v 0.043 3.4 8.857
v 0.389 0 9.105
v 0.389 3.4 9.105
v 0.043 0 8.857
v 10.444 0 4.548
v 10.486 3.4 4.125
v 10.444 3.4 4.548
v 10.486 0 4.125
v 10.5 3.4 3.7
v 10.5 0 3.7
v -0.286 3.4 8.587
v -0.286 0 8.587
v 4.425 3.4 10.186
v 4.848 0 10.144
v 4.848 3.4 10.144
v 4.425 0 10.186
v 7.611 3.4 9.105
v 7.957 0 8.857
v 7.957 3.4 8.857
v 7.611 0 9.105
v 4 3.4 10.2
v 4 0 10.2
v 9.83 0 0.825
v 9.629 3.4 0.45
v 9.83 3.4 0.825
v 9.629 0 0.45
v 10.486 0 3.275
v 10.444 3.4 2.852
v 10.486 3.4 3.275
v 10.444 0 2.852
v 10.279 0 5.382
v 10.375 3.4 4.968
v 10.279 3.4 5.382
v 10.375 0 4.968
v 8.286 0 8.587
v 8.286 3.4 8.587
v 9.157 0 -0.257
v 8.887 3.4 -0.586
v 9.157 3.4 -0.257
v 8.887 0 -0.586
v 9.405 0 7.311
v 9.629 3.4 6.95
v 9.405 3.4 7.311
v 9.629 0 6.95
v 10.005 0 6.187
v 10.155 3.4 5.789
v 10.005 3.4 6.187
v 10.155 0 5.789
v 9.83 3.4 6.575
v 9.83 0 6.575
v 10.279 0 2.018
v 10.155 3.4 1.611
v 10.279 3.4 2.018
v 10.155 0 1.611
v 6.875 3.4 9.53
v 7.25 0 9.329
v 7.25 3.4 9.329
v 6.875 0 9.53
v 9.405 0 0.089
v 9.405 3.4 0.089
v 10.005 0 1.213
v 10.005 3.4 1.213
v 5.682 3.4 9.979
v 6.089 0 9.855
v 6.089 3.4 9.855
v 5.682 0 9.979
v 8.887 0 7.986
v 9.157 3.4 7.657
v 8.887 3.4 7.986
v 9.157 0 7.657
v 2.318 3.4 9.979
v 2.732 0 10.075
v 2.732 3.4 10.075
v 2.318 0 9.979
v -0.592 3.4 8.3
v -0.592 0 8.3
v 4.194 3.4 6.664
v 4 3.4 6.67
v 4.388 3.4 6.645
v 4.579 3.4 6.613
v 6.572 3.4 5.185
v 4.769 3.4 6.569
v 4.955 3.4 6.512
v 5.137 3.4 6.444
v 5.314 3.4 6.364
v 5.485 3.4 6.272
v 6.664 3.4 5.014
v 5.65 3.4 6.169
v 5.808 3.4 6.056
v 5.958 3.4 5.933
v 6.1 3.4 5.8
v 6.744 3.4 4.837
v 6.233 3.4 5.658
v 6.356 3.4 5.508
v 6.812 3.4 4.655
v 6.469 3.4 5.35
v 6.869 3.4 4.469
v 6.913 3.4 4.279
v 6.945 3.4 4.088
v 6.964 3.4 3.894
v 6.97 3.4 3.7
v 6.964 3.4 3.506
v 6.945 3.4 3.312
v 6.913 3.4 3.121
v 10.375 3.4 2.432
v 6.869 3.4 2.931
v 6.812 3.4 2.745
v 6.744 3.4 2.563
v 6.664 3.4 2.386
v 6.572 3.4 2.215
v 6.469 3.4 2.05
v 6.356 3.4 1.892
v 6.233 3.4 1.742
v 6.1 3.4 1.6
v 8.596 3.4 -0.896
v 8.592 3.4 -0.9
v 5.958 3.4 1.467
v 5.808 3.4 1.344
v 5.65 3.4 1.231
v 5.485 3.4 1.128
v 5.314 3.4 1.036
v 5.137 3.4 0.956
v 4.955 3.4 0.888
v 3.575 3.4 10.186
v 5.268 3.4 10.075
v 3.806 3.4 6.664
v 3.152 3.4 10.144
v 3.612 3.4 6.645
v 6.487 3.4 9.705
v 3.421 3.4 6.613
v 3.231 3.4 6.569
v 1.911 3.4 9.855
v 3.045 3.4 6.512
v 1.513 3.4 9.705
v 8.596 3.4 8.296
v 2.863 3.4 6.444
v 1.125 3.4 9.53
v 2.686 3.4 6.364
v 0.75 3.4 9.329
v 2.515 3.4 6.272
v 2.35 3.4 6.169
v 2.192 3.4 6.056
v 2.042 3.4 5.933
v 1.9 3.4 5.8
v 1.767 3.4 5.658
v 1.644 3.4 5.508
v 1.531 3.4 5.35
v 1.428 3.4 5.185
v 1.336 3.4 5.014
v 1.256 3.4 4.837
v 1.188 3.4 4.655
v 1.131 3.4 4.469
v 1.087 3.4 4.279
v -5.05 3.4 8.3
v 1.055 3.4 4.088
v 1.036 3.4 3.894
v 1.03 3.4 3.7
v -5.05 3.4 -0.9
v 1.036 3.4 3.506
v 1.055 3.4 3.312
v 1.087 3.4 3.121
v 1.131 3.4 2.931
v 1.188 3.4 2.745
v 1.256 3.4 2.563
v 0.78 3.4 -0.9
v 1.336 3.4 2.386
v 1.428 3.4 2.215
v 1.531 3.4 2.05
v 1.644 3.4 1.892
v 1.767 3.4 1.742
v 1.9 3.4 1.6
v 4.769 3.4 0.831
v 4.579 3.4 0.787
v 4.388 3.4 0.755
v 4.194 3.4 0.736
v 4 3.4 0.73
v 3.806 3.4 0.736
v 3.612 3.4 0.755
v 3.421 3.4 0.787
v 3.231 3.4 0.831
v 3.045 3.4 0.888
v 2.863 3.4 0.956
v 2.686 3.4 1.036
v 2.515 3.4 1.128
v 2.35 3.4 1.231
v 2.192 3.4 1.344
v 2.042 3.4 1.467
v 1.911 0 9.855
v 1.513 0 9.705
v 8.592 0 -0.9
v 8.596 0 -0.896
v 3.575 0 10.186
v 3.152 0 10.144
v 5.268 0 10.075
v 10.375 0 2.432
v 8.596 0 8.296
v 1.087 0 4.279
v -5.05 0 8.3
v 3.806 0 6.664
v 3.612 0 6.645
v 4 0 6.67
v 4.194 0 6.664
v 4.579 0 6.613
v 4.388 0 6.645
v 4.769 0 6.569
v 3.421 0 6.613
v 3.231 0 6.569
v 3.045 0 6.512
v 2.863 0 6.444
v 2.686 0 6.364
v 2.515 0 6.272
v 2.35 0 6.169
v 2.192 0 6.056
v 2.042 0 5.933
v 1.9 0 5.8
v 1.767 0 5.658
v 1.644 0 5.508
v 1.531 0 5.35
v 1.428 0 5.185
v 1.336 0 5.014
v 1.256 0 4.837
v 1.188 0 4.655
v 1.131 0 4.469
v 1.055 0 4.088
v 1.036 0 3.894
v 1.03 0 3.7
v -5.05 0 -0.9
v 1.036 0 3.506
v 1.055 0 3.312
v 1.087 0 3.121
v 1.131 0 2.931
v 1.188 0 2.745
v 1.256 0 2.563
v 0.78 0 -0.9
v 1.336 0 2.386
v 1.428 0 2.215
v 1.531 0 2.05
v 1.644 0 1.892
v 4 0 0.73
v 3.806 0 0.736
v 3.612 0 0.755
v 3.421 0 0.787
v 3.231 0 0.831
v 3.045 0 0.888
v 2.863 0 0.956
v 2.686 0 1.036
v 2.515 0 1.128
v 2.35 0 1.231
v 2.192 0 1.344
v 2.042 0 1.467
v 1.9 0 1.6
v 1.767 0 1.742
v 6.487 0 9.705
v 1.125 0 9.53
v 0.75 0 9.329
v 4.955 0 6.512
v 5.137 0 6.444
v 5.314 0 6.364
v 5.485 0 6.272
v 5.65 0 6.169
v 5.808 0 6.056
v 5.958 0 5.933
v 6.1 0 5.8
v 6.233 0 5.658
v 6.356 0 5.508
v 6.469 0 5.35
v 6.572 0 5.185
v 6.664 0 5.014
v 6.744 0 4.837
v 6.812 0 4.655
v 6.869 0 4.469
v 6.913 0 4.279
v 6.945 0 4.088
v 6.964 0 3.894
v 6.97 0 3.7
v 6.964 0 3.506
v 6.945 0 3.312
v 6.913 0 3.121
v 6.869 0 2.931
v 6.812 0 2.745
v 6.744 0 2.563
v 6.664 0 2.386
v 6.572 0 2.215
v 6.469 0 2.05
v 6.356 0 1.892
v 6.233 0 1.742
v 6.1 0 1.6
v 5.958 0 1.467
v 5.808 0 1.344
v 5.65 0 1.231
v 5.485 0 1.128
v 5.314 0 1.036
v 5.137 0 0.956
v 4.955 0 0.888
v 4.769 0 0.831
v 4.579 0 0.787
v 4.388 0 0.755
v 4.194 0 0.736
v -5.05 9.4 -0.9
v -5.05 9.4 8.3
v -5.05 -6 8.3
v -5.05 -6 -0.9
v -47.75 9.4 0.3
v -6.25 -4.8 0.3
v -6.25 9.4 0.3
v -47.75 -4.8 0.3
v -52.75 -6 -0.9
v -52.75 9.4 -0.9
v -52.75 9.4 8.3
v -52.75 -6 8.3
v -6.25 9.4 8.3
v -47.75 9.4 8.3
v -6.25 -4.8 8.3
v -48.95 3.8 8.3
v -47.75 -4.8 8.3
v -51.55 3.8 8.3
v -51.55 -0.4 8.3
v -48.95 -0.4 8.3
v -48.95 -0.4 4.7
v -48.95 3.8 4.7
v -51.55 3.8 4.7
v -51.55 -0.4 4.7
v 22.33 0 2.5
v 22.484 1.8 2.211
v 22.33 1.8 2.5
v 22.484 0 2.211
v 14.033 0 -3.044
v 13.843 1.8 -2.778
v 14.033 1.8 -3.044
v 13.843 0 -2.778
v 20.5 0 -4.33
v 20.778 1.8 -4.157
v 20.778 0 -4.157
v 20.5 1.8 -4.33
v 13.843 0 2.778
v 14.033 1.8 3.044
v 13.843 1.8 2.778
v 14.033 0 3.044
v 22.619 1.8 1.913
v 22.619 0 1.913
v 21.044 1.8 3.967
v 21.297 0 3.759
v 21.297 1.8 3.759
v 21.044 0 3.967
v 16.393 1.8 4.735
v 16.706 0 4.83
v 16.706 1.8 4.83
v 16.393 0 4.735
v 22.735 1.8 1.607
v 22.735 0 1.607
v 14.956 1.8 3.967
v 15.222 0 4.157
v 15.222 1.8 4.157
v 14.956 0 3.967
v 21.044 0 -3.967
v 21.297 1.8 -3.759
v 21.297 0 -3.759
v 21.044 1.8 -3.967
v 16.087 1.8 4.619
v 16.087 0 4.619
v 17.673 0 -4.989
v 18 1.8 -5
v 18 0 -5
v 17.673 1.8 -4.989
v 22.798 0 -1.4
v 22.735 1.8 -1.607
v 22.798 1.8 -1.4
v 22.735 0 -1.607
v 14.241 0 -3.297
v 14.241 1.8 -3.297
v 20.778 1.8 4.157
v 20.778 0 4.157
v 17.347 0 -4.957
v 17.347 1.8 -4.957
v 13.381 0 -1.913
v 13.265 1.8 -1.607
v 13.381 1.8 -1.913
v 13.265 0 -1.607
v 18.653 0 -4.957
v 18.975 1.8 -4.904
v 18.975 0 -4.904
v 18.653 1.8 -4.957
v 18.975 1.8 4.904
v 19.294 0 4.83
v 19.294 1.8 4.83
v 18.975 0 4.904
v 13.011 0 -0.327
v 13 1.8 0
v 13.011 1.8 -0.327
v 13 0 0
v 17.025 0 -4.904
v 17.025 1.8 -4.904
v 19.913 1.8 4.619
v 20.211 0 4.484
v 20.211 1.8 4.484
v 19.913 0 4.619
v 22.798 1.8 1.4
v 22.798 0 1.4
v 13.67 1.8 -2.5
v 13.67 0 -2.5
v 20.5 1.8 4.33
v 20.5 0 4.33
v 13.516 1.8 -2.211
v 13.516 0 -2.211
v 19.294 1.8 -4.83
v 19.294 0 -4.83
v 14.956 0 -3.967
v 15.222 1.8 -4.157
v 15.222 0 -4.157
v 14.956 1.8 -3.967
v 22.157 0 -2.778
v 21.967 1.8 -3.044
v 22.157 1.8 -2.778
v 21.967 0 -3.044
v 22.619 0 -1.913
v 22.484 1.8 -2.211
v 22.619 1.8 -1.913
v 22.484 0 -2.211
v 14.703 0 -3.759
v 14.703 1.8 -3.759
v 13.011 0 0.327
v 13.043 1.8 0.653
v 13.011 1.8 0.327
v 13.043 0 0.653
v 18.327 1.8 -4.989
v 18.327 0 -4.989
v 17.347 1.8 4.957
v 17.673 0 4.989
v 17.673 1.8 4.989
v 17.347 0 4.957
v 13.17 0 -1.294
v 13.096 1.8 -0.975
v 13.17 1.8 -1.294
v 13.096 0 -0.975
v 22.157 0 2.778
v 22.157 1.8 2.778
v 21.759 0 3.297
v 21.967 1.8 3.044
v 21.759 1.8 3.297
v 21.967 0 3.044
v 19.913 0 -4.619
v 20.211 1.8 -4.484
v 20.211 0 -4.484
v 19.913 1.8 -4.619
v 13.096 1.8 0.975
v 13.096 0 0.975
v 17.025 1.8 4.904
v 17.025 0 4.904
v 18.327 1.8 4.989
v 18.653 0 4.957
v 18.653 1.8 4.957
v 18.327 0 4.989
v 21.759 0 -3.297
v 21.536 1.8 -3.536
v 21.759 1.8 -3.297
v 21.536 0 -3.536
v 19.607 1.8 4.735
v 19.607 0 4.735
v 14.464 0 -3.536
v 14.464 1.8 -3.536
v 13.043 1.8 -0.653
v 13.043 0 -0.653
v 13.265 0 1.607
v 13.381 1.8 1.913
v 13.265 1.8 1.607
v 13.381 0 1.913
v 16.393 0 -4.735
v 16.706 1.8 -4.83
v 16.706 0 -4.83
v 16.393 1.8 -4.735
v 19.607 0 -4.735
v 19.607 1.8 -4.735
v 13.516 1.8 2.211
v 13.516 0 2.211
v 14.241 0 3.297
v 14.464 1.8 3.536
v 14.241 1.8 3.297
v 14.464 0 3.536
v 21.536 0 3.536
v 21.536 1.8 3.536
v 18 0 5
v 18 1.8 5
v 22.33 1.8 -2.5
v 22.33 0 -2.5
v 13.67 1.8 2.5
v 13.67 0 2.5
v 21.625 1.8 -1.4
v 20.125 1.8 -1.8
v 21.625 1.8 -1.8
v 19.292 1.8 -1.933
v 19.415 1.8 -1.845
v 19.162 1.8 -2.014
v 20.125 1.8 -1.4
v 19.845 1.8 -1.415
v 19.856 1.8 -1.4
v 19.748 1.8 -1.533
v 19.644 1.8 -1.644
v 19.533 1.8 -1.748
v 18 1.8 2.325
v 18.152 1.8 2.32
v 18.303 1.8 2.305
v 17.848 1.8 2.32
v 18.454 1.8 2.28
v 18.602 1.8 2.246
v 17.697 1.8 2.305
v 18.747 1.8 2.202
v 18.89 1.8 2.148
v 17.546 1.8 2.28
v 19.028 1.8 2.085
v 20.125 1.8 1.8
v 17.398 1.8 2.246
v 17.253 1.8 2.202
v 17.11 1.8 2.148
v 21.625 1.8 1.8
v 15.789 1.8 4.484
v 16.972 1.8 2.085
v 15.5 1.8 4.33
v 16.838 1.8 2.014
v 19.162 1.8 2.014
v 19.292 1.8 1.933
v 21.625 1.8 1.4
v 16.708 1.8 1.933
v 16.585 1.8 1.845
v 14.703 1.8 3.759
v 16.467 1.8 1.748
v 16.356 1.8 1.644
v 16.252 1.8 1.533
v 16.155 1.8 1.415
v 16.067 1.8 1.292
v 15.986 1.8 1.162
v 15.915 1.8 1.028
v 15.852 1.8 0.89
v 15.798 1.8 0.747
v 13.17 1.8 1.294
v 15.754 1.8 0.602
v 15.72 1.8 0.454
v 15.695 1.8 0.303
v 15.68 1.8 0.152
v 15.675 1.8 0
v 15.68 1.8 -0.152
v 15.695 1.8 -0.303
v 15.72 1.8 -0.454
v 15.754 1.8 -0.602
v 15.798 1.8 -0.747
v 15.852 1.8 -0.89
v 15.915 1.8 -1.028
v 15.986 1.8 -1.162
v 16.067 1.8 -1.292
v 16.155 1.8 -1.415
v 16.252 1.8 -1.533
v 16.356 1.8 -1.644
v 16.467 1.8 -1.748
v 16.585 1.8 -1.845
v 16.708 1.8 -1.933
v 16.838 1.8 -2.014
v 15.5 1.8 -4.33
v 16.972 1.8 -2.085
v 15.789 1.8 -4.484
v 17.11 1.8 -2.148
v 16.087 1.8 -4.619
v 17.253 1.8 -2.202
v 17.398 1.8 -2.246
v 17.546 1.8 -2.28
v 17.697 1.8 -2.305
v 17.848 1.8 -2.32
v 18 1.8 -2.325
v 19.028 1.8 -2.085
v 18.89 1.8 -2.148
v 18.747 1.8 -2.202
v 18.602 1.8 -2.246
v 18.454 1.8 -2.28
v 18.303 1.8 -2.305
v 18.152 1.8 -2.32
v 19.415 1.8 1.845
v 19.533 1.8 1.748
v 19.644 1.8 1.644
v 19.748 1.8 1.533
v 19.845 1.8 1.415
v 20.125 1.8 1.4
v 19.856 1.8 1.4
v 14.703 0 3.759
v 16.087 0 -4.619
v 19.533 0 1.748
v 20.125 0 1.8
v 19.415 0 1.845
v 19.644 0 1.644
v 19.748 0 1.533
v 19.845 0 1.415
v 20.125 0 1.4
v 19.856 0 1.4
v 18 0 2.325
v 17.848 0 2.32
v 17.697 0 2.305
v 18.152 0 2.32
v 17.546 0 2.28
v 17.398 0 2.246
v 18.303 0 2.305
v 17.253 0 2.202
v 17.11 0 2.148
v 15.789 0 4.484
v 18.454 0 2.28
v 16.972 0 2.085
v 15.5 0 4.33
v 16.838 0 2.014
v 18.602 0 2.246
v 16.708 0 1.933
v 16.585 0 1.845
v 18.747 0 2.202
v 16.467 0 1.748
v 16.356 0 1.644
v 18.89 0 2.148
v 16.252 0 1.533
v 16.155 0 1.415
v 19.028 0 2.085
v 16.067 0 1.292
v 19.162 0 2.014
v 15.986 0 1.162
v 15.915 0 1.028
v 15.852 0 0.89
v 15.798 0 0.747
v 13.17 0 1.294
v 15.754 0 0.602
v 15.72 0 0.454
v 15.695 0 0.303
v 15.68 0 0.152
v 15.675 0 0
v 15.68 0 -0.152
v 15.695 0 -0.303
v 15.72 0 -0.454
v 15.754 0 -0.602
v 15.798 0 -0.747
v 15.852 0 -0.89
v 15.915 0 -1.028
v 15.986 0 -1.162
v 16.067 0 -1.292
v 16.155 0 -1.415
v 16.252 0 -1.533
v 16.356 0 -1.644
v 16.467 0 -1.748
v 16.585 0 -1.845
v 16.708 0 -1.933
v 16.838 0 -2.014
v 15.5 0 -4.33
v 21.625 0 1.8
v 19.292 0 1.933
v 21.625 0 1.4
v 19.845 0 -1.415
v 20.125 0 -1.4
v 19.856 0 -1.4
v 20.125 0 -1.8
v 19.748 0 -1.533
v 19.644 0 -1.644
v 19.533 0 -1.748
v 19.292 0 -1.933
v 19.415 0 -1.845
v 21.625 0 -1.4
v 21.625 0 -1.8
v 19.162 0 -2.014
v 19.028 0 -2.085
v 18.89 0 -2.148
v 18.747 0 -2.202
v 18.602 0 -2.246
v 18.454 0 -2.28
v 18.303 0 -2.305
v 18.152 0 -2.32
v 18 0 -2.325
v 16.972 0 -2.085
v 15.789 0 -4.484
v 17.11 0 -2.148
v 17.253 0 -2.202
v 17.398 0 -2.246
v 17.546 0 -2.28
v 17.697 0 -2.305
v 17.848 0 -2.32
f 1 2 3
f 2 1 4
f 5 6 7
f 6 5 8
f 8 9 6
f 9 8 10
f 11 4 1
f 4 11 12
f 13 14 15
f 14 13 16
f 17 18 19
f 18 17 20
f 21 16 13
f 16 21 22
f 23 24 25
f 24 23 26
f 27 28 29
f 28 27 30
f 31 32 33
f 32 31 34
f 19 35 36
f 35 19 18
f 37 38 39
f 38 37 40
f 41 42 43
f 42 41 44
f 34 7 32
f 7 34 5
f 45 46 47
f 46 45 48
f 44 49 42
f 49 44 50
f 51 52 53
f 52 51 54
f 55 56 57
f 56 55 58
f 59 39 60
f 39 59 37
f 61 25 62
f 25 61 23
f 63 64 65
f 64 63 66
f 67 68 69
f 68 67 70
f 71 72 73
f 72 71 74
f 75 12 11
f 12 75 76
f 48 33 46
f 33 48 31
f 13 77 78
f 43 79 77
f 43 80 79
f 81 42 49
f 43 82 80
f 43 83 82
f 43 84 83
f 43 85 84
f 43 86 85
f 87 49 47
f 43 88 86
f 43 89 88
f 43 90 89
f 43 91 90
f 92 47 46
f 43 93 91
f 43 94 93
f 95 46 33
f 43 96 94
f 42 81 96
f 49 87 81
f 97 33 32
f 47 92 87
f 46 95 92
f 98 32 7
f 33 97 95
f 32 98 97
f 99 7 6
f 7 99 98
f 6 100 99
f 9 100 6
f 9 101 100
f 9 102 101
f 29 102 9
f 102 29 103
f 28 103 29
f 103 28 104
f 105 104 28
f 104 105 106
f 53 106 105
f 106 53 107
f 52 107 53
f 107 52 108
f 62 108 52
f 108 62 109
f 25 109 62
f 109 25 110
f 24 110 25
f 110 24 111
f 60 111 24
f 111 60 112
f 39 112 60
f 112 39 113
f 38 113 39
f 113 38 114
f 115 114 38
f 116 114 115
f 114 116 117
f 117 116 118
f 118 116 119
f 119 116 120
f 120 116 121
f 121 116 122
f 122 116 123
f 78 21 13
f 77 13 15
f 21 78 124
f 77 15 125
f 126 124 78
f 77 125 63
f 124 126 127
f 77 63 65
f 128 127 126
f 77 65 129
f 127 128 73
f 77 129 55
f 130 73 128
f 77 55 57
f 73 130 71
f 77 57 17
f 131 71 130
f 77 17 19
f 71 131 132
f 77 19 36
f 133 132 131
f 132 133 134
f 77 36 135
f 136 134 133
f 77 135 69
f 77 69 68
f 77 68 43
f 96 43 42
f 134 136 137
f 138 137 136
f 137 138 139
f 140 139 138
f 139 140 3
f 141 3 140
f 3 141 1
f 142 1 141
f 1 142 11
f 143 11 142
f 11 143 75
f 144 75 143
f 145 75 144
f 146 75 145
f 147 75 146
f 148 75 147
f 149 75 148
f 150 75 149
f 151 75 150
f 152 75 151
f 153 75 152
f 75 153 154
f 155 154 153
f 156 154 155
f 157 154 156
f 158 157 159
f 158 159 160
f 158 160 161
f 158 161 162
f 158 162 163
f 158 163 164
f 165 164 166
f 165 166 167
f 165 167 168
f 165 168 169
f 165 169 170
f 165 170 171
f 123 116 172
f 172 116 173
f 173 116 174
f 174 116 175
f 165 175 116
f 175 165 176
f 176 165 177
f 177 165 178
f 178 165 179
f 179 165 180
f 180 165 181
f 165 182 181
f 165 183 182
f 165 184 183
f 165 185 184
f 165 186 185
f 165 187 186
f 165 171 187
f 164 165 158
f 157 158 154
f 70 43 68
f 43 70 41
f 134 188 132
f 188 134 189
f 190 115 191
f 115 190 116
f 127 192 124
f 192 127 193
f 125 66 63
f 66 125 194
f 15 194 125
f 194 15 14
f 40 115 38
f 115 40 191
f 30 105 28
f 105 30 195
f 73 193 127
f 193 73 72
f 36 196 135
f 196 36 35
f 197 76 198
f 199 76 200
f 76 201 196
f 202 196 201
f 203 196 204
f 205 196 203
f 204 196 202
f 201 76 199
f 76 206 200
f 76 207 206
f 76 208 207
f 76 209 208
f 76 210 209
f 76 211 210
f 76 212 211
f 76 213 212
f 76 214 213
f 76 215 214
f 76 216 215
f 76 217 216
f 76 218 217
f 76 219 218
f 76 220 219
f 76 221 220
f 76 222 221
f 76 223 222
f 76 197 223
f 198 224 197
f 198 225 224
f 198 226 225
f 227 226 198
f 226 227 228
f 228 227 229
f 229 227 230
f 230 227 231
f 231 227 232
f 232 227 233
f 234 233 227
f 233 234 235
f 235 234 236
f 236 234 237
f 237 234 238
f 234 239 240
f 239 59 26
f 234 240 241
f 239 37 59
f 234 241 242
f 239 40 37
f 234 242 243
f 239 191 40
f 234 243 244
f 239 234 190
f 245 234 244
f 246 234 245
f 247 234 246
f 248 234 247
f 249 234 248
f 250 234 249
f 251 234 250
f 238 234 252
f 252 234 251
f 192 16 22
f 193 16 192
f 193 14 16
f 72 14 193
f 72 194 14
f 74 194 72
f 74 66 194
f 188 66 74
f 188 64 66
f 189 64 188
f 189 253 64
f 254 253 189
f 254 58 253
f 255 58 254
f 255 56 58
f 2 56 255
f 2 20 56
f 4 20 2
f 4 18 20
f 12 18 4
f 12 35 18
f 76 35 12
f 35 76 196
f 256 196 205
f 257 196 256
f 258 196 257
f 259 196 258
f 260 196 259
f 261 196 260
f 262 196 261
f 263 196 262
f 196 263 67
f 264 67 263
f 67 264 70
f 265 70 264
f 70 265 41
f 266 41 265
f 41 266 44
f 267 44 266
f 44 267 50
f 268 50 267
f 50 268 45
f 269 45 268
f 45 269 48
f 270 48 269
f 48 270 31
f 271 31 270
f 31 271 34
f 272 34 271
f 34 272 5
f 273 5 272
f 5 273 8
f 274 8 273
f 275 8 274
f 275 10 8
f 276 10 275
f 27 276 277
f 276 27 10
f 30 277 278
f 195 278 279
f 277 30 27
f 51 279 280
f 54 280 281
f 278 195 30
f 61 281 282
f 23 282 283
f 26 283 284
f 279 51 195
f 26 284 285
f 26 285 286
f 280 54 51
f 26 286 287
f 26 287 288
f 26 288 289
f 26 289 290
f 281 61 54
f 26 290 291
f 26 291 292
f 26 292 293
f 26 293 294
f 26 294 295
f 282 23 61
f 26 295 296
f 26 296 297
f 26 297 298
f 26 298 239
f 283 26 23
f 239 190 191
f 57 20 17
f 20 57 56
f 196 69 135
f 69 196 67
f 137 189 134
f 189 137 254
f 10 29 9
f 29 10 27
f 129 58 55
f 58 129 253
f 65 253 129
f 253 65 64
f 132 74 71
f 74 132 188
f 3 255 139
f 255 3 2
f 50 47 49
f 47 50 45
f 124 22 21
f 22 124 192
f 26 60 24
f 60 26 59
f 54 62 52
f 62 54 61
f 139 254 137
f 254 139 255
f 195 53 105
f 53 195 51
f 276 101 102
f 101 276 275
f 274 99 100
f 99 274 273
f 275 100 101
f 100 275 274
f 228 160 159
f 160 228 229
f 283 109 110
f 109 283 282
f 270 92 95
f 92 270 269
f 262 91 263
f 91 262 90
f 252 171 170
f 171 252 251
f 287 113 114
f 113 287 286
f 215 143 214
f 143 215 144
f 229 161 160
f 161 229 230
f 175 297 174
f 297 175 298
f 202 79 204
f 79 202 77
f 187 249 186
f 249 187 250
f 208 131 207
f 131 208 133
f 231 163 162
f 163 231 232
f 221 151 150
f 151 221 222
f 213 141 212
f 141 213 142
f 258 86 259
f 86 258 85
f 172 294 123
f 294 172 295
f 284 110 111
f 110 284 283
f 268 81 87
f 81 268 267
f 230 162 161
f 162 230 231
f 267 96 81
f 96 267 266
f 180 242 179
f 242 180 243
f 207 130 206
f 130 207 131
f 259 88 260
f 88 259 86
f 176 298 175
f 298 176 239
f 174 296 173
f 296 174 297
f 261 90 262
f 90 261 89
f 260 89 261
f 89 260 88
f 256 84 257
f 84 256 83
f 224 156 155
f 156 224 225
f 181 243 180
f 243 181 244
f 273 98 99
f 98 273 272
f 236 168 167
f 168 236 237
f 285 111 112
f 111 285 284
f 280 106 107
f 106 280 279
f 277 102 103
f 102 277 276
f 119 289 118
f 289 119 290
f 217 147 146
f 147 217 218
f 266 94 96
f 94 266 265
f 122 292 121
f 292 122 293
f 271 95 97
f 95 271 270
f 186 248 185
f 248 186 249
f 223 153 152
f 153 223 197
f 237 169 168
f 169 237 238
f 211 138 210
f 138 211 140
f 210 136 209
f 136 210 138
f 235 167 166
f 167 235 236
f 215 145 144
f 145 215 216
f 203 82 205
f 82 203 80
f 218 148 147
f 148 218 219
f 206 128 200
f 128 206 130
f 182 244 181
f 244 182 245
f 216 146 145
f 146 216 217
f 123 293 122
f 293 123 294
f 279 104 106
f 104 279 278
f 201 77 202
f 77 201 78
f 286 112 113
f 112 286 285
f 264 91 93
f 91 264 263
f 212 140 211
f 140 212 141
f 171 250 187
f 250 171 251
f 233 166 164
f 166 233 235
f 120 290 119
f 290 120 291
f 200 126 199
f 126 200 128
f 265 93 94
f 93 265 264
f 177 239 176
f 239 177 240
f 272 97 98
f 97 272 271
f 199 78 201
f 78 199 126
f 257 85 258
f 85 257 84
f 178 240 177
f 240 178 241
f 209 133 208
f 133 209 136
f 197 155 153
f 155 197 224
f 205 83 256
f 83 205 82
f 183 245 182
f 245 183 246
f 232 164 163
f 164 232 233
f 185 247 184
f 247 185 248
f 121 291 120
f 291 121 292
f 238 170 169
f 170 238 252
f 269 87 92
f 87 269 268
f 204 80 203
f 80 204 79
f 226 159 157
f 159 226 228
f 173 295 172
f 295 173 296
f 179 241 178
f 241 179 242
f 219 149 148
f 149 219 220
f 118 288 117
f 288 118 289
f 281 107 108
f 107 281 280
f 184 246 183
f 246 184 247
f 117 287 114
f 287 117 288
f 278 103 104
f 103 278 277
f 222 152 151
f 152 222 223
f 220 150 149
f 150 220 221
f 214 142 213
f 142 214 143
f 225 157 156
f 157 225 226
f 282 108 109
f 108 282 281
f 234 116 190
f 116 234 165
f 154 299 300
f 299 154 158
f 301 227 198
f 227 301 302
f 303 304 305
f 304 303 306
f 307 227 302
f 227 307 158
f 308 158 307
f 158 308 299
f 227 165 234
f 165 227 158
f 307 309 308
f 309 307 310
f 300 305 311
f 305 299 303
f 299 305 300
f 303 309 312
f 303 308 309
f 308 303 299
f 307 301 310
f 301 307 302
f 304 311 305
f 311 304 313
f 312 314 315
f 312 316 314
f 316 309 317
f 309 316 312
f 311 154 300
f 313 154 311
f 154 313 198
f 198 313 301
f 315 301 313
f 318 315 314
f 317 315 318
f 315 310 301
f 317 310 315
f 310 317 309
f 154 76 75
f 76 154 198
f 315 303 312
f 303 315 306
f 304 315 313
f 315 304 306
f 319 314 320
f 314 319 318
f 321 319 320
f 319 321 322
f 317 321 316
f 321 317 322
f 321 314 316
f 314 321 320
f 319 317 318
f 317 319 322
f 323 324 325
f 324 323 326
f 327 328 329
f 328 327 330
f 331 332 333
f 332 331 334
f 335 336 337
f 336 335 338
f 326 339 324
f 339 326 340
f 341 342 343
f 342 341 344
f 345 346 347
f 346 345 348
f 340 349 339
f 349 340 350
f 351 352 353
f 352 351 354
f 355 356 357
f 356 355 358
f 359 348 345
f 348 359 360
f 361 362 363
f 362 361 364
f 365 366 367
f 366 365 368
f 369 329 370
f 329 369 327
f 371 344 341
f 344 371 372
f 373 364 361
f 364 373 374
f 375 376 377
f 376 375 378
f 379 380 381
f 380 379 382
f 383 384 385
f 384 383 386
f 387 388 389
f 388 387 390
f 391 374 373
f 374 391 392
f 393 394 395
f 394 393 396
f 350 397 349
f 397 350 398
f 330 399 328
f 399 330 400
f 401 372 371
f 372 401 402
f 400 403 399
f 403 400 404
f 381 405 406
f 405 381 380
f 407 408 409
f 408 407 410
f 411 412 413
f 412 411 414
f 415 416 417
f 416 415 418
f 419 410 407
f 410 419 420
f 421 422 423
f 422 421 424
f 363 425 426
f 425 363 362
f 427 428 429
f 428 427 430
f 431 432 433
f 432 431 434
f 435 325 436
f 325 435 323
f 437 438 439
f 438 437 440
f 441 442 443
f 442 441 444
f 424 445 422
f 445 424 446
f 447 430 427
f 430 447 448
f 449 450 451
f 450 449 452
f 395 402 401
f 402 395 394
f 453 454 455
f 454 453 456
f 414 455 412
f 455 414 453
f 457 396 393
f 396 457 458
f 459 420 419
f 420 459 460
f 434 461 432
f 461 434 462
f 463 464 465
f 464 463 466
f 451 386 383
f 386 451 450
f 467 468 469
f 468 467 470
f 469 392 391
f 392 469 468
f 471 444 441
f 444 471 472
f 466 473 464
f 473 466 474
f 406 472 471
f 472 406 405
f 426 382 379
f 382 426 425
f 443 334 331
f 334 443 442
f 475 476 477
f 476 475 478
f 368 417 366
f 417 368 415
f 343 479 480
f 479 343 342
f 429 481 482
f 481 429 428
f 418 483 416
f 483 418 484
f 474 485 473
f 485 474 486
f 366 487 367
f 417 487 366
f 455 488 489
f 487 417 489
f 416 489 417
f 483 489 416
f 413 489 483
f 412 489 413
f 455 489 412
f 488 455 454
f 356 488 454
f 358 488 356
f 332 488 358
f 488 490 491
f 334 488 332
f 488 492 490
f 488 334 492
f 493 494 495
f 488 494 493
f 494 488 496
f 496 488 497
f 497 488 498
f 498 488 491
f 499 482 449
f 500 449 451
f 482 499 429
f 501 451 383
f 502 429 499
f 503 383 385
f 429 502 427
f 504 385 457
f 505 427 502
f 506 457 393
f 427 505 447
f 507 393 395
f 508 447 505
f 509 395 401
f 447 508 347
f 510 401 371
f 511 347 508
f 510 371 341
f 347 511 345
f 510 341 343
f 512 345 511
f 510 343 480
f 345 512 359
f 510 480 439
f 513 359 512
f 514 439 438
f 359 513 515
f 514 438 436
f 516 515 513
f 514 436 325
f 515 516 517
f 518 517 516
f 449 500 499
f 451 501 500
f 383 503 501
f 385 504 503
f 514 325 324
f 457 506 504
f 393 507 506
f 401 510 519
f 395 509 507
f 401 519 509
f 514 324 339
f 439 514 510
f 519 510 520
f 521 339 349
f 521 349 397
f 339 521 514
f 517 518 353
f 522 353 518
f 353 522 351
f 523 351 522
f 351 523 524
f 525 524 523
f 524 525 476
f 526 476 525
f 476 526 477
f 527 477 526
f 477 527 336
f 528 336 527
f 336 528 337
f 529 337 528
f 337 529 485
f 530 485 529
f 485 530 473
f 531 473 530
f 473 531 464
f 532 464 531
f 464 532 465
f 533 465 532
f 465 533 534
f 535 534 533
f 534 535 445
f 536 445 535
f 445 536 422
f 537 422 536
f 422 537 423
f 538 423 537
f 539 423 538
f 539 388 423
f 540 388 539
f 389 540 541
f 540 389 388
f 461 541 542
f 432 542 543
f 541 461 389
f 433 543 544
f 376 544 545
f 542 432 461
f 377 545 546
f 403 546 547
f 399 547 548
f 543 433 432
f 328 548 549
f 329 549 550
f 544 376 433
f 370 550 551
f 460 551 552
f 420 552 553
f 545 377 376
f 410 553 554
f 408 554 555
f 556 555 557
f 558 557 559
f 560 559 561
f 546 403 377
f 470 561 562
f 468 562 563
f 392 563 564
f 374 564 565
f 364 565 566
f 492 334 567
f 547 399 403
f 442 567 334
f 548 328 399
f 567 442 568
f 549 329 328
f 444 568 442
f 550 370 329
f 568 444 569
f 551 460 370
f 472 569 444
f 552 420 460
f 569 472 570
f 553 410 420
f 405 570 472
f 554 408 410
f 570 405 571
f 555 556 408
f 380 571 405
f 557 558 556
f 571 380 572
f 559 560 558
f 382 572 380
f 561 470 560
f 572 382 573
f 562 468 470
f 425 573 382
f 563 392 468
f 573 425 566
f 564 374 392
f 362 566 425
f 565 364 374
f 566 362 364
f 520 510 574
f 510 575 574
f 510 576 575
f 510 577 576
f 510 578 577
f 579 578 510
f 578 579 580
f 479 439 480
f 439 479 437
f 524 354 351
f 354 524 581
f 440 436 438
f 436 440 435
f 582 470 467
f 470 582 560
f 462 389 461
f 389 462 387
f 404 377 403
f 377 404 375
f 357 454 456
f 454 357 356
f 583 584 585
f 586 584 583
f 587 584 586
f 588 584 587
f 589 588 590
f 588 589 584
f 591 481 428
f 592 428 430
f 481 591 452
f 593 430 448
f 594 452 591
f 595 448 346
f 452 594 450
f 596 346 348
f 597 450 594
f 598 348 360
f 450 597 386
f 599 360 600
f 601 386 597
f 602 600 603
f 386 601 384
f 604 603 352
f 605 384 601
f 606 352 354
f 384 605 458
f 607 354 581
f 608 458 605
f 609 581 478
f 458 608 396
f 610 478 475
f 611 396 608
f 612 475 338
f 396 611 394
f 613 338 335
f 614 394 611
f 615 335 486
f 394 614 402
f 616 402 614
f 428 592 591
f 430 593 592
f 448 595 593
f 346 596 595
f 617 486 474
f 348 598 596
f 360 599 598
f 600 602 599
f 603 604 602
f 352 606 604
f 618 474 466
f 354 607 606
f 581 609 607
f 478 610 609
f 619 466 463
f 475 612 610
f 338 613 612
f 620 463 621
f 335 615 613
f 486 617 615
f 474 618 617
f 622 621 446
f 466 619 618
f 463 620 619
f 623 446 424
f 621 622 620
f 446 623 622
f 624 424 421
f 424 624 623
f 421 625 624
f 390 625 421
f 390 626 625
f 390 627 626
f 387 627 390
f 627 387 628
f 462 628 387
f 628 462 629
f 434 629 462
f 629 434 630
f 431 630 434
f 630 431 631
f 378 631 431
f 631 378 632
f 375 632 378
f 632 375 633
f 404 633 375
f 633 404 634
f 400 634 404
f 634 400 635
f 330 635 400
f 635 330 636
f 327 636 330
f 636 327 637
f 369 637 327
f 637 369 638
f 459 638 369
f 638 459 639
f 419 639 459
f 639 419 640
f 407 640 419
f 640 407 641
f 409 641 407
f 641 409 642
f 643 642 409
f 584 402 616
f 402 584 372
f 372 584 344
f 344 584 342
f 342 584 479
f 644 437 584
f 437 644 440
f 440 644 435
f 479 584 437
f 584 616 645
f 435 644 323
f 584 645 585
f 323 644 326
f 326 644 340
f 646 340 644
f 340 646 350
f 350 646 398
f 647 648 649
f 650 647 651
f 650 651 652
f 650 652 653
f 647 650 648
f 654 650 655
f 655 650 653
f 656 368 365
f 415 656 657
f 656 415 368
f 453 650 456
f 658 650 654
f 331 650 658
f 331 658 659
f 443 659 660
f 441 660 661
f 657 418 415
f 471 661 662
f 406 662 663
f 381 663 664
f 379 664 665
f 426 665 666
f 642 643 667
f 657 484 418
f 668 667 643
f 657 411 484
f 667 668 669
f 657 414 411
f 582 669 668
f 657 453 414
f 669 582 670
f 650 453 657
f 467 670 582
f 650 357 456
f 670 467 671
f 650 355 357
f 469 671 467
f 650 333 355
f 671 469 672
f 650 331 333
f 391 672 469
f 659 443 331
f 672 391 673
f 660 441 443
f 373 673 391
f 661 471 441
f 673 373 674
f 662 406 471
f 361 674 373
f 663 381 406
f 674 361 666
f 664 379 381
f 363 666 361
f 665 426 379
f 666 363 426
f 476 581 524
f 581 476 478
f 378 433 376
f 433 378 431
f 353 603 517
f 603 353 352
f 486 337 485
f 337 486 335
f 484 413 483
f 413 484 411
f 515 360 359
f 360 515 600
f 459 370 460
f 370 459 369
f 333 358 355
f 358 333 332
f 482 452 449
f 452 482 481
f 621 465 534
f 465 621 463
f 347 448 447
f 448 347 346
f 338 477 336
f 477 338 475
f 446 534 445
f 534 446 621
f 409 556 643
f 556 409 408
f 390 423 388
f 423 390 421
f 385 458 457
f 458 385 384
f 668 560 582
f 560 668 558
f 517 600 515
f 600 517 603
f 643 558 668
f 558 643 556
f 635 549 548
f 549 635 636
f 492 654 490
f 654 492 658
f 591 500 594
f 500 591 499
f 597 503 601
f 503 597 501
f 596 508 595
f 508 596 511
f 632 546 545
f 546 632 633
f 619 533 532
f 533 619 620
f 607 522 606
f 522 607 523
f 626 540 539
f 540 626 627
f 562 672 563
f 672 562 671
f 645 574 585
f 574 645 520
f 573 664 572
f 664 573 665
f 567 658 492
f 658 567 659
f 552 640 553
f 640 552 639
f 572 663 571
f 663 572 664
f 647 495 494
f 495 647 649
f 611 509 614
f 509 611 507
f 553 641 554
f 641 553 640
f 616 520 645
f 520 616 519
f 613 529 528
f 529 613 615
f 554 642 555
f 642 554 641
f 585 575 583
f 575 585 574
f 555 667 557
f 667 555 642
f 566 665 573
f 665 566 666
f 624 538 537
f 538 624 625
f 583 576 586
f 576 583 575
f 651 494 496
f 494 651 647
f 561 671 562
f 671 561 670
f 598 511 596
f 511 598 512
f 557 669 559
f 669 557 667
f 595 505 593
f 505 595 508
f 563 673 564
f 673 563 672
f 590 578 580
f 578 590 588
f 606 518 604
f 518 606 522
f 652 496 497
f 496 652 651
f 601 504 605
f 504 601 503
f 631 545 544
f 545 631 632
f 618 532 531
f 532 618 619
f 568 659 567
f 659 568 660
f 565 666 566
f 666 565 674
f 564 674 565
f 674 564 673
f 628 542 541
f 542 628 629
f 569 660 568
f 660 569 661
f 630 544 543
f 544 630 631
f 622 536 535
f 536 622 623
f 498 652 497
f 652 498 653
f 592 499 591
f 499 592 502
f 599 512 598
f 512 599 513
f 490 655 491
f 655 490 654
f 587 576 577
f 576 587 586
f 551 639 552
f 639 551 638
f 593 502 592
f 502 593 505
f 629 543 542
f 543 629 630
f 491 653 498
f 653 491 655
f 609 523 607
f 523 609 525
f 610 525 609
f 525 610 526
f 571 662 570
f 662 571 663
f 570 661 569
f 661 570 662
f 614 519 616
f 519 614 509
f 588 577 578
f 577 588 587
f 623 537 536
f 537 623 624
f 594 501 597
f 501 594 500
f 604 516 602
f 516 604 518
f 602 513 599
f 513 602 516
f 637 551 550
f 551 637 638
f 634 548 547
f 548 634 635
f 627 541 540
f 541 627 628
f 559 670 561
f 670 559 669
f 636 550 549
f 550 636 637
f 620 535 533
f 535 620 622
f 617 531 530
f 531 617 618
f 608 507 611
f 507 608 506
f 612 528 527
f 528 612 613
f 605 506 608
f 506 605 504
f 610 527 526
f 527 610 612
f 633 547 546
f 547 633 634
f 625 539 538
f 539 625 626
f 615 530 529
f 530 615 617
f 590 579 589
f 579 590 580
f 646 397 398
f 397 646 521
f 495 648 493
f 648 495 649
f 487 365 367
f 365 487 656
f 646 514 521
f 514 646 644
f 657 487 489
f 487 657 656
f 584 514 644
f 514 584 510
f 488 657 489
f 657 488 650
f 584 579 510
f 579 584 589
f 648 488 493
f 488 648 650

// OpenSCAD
// DOUBLE TAKE FRAMES DESIGN RELEASE
// DTF_RELEASE: 2.0.0
// Released: 2026-08-31
// Versioning: Semantic Versioning 2.0.0 (https://semver.org/)
// Status: CANONICAL
// Changes in 2.0.0:
// - Carried forward without geometry changes for the coordinated 2.0.0 release.
// Full release notes: https://doubletakeframes.com/build/#design-release
//
$fn = 96;

eps = 0.05;

// 0 = separated printable latch and keeper
// 1 = FN-weight latch only
// 2 = C-shaped keeper only
render_part = 0;

// =========================================================
// FN WEIGHT LATCH
// =========================================================
post_d = 5.5;
clear_radial = 0.22;
eye_inner_d = post_d + 2 * clear_radial;
eye_outer_d = 13.0;

latch_t = 3.4;
pivot_x = 4.0;

corral_clear_w_x = 41.5;
corral_clear_d_y = 13.0;
corral_wall_t = 1.2;
corral_depth_z = 8.0;
corral_floor_t = 1.2;
corral_end_wall_t_x = 5.0;
canonical_weight_center_x = -27.0;

// Match the installed latch plane used by the canonical dry-wall rig.
standoff_h = 0.8;
post_h = 4.0;
corral_global_outer_y1 = -0.30;
corral_center_y_target = corral_global_outer_y1
                         - (corral_clear_d_y + 2 * corral_wall_t) / 2;
pad_t = -corral_center_y_target - standoff_h - post_h / 2;
post_y1 = -pad_t - standoff_h - post_h;
latch_install_y = post_y1 + (post_h - latch_t) / 2;

corral_inner_x0 = canonical_weight_center_x - corral_clear_w_x / 2;
corral_inner_x1 = canonical_weight_center_x + corral_clear_w_x / 2;
corral_floor_x0 = corral_inner_x0 - corral_end_wall_t_x;
corral_floor_x1 = corral_inner_x1 + corral_wall_t;

corral_outer_y1 = corral_global_outer_y1 - latch_install_y;
corral_inner_y1 = corral_outer_y1 - corral_wall_t;
corral_inner_y0 = corral_inner_y1 - corral_clear_d_y;
corral_outer_y0 = corral_inner_y0 - corral_wall_t;

corral_floor_z0 = -0.90;
corral_floor_z = corral_floor_z0 + corral_floor_t;
corral_wall_z1 = corral_floor_z + corral_depth_z;
pivot_z = (corral_floor_z0 + corral_wall_z1) / 2;
pivot_eye_flat_local_z = corral_floor_z0 - pivot_z;

pivot_transition_x0 = corral_floor_x1;
pivot_transition_x1 = pivot_x - (eye_inner_d / 2 + 0.25);

// Far-end Y-retention socket. The matching roof-hung tooth belongs to the
// fixed dry-wall rig; this socket is open at the top so the latch disengages
// cleanly as it swings downward.
latch_key_tooth_w_x = 1.4;
latch_key_tooth_w_y = 3.0;
latch_key_clear_xy = 0.60;
latch_key_clear_z = 0.60;
latch_key_engagement_z = 3.0;

latch_key_xc = (corral_floor_x0 + corral_inner_x0) / 2;
latch_key_local_yc = (corral_outer_y0 + corral_outer_y1) / 2;
latch_key_notch_x0 = latch_key_xc - latch_key_tooth_w_x / 2
                     - latch_key_clear_xy;
latch_key_notch_x1 = latch_key_xc + latch_key_tooth_w_x / 2
                     + latch_key_clear_xy;
latch_key_notch_y0 = latch_key_local_yc - latch_key_tooth_w_y / 2
                     - latch_key_clear_xy;
latch_key_notch_y1 = latch_key_local_yc + latch_key_tooth_w_y / 2
                     + latch_key_clear_xy;
latch_key_notch_z0 = corral_wall_z1 - latch_key_engagement_z
                     - latch_key_clear_z;

// =========================================================
// C-SHAPED KEEPER
// =========================================================
clip_outer_d = 10.0;
clip_t = 1.8;
grip_hole_d = 4.65;
gap_w = 2.8;
flat_depth = 1.5;

// =========================================================
// HELPERS
// =========================================================
module rect_prism(x0, x1, y0, y1, z0, z1) {
    translate([min(x0, x1), min(y0, y1), min(z0, z1)])
        cube([abs(x1 - x0), abs(y1 - y0), abs(z1 - z0)]);
}

module cyl_y_span(d, y0, y1) {
    translate([0, max(y0, y1), 0])
        rotate([90, 0, 0])
            cylinder(d=d, h=abs(y1 - y0), center=false);
}

// =========================================================
// PRINTABLE PARTS
// =========================================================
module canonical_latch_core() {
    translate([pivot_x, 0, pivot_z])
        difference() {
            cyl_y_span(eye_outer_d, 0, latch_t);
            cyl_y_span(eye_inner_d, -0.1, latch_t + 0.2);

            // Flatten only the unused lower eye arc so the complete latch
            // prints on the same plane as the corral floor.
            rect_prism(-eye_outer_d / 2 - 1,
                       eye_outer_d / 2 + 1,
                       -0.1, latch_t + 0.2,
                       -eye_outer_d / 2 - 1,
                       pivot_eye_flat_local_z);
        }
}

module fn_weight_corral() {
    difference() {
        union() {
            // Shallow floor beneath the weight pocket and keyed extension.
            rect_prism(corral_floor_x0, corral_floor_x1,
                       corral_outer_y0, corral_outer_y1,
                       corral_floor_z0, corral_floor_z);

            // Viewer-facing wall. The frame wall closes the opposite side.
            rect_prism(corral_inner_x0, corral_inner_x1,
                       corral_outer_y0, corral_inner_y0,
                       corral_floor_z, corral_wall_z1);

            // Pivot-side wall.
            rect_prism(corral_inner_x1, corral_floor_x1,
                       corral_outer_y0, corral_outer_y1,
                       corral_floor_z, corral_wall_z1);

            // Substantial far-end wall carrying the retention socket.
            rect_prism(corral_floor_x0, corral_inner_x0,
                       corral_outer_y0, corral_outer_y1,
                       corral_floor_z, corral_wall_z1);

            // Compact load path from the corral into the pivot eye.
            rect_prism(pivot_transition_x0, pivot_transition_x1,
                       0, latch_t,
                       corral_floor_z0, corral_wall_z1);
        }

        rect_prism(latch_key_notch_x0, latch_key_notch_x1,
                   latch_key_notch_y0, latch_key_notch_y1,
                   latch_key_notch_z0, corral_wall_z1 + eps);
    }
}

module swinging_latch() {
    union() {
        canonical_latch_core();
        fn_weight_corral();
    }
}

module c_keeper() {
    difference() {
        cyl_y_span(clip_outer_d, 0, clip_t);
        cyl_y_span(grip_hole_d, -0.1, clip_t + 0.2);

        rect_prism(0, clip_outer_d / 2 + 0.5,
                   -0.1, clip_t + 0.1,
                   -gap_w / 2, gap_w / 2);

        rect_prism(grip_hole_d / 2 - 0.2,
                   grip_hole_d / 2 - 0.2 + flat_depth,
                   -0.1, clip_t + 0.1,
                   -gap_w / 2 - 0.4, gap_w / 2 + 0.4);
    }
}

assert(corral_clear_w_x == 41.5);
assert(corral_clear_d_y == 13.0);
assert(pivot_transition_x1 > pivot_transition_x0);

if (render_part == 1)
    swinging_latch();
else if (render_part == 2)
    c_keeper();
else {
    swinging_latch();
    translate([18, 0, 0]) c_keeper();
}
